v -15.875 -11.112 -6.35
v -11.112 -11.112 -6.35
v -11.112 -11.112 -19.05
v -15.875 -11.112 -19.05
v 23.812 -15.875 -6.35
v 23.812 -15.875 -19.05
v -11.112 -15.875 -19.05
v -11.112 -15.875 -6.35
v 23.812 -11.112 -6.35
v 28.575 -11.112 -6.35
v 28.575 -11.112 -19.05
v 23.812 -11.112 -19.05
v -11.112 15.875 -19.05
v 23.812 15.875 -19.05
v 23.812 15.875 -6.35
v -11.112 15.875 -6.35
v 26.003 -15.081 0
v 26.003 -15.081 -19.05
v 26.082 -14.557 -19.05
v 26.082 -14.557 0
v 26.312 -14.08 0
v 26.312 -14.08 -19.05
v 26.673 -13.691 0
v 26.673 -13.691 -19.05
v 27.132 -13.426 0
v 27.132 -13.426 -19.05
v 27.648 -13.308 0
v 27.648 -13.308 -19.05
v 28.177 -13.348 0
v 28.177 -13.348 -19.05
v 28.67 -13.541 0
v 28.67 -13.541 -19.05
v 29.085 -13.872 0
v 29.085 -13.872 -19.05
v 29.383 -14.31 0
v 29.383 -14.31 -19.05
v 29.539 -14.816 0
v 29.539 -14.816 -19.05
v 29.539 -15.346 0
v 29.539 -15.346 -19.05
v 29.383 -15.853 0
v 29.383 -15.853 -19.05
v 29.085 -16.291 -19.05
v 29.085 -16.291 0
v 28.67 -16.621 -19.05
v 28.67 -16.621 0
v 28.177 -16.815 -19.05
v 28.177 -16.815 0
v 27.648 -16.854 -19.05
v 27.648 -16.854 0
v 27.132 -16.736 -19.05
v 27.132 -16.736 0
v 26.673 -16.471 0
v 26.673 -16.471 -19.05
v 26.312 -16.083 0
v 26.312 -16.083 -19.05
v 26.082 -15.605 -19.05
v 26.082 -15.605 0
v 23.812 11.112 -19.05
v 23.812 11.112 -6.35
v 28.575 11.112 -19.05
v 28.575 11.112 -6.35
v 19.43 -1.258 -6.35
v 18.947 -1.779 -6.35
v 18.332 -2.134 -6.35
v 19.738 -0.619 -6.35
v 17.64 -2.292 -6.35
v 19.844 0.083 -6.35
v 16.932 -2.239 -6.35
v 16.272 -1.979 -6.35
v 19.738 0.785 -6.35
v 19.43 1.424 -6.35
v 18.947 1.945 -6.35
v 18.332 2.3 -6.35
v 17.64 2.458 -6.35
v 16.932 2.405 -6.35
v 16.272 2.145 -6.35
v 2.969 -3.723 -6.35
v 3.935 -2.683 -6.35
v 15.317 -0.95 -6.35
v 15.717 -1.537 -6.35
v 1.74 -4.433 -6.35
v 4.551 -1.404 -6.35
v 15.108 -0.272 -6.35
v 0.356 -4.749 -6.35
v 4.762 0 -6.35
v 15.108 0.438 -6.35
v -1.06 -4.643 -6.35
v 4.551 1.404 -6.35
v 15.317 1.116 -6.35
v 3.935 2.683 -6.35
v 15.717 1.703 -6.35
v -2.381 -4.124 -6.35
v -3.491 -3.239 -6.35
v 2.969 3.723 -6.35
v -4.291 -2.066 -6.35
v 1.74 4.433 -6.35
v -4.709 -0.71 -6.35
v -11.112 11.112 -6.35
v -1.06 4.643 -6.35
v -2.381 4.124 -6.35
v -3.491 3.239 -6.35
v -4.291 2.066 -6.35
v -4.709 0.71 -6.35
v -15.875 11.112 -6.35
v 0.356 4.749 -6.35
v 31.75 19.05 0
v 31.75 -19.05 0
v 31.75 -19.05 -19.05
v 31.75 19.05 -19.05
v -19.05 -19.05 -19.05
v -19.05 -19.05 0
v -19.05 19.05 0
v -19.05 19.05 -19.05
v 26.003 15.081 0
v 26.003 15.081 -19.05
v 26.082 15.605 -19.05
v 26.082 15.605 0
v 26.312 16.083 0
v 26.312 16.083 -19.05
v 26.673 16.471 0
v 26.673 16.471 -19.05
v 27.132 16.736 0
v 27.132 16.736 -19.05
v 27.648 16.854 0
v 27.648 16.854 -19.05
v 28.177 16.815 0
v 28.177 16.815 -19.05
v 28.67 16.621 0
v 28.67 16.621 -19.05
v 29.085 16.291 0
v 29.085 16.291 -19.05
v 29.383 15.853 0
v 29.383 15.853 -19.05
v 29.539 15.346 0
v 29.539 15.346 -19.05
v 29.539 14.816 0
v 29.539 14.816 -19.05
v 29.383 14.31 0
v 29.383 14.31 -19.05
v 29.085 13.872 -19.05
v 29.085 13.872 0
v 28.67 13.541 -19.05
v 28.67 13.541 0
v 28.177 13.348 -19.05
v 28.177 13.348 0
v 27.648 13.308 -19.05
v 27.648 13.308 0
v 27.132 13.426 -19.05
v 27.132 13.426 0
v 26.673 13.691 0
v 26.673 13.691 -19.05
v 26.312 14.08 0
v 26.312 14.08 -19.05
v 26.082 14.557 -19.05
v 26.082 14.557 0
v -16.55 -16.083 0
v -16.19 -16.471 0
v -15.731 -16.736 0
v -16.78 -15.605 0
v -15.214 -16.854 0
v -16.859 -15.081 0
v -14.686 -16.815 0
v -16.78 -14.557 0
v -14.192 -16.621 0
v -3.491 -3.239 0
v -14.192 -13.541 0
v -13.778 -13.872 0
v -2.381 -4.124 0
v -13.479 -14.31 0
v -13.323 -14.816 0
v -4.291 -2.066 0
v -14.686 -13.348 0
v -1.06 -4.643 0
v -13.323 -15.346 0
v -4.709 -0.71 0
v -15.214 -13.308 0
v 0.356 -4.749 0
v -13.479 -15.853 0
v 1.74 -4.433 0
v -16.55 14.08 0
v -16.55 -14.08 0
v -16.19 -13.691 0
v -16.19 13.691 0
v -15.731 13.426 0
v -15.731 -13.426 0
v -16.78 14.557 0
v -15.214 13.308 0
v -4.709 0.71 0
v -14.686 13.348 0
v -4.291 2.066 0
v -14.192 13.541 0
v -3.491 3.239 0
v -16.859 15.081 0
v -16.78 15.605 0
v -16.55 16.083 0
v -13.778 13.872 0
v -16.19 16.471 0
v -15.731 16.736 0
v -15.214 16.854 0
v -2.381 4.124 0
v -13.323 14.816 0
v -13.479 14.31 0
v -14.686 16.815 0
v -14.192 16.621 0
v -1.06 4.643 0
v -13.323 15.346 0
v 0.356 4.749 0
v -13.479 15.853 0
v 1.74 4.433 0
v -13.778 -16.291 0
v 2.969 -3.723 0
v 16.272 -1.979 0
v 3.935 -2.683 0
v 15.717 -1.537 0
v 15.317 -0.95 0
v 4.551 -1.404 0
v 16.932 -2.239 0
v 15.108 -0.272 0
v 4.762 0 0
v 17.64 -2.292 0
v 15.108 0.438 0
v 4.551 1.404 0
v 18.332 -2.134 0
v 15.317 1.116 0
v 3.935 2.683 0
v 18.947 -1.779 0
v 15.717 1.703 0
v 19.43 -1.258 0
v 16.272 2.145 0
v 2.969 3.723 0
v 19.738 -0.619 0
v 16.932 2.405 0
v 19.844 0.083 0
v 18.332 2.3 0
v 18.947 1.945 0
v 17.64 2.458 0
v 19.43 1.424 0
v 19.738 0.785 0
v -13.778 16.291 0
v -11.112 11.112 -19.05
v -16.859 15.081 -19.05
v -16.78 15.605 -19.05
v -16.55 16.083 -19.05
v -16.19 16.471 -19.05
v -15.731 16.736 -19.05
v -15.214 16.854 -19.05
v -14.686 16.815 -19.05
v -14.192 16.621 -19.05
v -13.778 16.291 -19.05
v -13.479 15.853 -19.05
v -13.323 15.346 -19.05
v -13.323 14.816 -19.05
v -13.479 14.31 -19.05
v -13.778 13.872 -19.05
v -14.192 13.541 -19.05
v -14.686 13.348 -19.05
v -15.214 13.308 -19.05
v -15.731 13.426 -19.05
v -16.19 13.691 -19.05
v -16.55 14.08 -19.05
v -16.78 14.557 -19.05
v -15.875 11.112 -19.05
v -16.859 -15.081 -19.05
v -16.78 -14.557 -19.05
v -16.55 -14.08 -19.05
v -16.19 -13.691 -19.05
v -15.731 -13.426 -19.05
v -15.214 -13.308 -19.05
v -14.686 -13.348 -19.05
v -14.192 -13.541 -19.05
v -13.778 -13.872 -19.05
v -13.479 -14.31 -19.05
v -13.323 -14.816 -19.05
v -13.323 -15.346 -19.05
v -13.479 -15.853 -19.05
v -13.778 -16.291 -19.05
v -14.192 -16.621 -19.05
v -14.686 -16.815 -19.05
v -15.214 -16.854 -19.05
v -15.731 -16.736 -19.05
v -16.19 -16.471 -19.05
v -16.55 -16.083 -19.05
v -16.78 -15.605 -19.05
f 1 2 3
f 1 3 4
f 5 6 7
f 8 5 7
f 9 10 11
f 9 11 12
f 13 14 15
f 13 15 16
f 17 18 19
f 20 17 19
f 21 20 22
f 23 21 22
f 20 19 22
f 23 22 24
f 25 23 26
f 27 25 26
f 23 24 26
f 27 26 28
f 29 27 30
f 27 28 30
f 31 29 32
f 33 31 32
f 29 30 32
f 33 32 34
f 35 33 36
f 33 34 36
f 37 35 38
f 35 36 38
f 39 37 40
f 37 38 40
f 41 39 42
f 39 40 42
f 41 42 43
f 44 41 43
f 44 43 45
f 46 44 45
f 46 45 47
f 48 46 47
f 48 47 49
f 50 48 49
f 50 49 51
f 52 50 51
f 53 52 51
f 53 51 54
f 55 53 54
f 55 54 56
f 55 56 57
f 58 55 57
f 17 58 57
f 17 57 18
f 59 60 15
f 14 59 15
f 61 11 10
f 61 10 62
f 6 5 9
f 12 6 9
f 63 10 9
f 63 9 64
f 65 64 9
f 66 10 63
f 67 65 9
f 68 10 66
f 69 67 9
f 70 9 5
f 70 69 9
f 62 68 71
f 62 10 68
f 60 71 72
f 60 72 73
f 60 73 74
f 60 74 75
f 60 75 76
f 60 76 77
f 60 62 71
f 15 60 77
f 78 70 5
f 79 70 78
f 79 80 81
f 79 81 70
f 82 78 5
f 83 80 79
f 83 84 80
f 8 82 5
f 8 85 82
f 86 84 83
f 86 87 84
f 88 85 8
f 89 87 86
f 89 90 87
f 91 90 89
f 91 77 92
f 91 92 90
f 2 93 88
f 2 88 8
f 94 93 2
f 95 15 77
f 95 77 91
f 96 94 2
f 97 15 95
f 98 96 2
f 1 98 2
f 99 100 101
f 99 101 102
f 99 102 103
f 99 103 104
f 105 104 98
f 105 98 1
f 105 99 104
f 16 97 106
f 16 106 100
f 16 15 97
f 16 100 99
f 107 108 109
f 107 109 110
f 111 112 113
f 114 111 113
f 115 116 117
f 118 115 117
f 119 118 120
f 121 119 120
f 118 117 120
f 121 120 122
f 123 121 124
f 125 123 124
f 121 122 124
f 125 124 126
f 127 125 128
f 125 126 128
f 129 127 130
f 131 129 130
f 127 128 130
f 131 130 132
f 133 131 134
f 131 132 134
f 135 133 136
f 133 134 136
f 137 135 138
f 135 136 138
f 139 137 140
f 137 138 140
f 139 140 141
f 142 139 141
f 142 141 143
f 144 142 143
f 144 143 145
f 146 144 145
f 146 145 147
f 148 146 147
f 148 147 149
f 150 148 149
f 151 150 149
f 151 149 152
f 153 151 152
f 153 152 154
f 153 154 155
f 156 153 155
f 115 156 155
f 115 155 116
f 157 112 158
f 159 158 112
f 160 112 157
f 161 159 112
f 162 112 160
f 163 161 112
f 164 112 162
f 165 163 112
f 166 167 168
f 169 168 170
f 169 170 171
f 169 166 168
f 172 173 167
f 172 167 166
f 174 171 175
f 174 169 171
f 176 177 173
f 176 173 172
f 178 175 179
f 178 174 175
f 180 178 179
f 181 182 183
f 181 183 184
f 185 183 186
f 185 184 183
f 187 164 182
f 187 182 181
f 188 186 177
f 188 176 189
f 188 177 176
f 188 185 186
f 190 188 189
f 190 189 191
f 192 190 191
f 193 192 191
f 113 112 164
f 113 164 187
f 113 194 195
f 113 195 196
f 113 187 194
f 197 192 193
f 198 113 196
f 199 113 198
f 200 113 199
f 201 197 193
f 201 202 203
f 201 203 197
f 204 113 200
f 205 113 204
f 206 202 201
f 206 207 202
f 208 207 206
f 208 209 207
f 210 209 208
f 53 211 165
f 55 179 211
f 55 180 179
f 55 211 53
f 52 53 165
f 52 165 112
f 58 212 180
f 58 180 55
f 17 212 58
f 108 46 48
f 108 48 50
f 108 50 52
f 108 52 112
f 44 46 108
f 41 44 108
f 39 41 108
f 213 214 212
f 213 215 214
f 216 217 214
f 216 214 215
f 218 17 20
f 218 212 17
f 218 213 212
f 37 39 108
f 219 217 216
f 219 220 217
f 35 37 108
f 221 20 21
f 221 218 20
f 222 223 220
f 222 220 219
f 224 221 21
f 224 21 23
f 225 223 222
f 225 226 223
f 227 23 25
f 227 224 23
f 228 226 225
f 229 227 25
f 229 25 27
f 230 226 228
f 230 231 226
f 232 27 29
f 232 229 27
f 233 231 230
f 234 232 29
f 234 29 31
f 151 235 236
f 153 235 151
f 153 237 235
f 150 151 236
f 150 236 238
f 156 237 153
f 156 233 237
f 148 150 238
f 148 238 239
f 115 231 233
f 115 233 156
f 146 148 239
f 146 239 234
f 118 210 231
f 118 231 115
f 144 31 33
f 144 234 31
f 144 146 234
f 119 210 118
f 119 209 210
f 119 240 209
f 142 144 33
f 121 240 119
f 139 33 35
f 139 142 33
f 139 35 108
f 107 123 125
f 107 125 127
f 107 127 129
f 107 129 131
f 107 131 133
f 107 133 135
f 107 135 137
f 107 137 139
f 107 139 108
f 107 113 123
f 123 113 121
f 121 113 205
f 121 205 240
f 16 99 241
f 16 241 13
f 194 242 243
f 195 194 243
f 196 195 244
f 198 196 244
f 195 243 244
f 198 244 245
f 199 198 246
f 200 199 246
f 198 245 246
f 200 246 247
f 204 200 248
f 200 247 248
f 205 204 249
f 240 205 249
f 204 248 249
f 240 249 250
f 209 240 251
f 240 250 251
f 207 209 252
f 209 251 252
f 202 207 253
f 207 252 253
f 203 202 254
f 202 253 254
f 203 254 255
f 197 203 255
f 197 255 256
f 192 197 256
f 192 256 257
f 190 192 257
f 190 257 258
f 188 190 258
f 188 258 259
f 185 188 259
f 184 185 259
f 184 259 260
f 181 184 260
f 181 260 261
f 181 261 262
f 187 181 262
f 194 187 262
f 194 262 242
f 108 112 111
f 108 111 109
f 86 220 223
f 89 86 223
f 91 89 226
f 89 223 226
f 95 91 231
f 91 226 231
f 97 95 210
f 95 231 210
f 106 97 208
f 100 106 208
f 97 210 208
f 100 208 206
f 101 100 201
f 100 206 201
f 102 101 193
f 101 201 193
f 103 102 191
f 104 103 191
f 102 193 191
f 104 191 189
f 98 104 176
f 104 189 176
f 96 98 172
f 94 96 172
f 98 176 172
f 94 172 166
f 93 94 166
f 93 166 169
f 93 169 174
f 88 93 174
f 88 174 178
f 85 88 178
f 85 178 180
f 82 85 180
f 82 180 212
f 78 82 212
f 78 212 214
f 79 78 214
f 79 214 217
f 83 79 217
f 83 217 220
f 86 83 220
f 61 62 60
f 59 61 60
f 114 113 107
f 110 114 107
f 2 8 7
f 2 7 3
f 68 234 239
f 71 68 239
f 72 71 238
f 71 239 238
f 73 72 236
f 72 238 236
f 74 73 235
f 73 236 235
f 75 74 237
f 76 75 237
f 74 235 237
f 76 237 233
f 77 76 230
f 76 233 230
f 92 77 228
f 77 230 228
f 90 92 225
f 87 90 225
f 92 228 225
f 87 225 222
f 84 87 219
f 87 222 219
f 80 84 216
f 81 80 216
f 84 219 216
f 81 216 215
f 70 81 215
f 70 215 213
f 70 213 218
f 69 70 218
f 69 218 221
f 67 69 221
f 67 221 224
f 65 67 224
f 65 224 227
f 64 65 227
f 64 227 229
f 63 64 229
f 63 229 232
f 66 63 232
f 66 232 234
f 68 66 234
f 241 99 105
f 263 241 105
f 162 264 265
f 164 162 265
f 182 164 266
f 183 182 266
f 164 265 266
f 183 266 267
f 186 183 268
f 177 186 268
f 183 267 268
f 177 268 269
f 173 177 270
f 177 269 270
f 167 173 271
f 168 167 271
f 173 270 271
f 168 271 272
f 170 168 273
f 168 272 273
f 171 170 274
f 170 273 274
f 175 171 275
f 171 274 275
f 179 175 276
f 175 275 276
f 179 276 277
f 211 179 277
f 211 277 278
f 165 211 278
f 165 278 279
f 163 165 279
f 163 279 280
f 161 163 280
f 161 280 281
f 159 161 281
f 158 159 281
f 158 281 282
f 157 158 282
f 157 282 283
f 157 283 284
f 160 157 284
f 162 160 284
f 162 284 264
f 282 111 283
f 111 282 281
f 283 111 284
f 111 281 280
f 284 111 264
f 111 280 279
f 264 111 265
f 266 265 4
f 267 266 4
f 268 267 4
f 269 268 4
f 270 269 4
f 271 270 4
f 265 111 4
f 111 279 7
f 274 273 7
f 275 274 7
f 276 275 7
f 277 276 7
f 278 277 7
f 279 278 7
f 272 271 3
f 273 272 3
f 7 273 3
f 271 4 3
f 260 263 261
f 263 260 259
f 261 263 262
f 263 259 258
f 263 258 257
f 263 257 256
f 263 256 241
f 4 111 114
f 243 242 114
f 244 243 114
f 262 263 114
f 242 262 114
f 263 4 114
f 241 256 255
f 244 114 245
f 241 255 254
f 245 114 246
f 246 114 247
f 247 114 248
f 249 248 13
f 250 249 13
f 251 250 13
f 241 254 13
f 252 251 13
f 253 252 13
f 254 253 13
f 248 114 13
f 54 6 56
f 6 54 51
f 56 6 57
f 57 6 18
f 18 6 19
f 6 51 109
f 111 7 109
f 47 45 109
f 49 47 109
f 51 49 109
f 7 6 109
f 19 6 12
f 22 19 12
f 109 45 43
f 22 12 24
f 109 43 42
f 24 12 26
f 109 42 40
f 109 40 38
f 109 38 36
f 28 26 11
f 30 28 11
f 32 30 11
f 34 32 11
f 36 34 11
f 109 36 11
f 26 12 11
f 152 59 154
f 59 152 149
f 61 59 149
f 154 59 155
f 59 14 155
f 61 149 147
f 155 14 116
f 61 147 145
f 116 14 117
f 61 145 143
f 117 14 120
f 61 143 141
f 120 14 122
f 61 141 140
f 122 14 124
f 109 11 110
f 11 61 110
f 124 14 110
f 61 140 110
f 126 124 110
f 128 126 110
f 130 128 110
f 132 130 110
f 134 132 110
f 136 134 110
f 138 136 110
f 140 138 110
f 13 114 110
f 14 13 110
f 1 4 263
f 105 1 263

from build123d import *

# Parameters (mm, degrees)
SKETCH1_W           = 50.8
SKETCH1_H           = 38.1
BOSS_EXTRUDE1_DEPTH = 19.05
SKETCH2_W           = 44.45
SKETCH2_H           = 31.75
CUT_EXTRUDE1_DEPTH  = 12.7
SKETCH3_R           = 4.7625
SKETCH3_R_2         = 2.38125
CUT_EXTRUDE2_DEPTH  = 42.639734629
SKETCH4_W           = 7.9375
SKETCH4_H           = 7.9375
BOSS_EXTRUDE2_DEPTH = 12.7
SKETCH5_R           = 1.778
CUT_EXTRUDE3_DEPTH  = 42.639734629


with BuildPart() as part:
    # Sketch1 → Boss-Extrude1 (new body)
    with BuildSketch(Plane.XY):
        with Locations((6.35, 0)):
            Rectangle(SKETCH1_W, SKETCH1_H)
    extrude(amount=-BOSS_EXTRUDE1_DEPTH)

    # Sketch2 → Cut-Extrude1 (cut)
    with BuildSketch(Plane(origin=(0, 0, -19.05), x_dir=(-1, 0, 0), z_dir=(0, 0, -1))):
        with Locations((-6.35, 0)):
            Rectangle(SKETCH2_W, SKETCH2_H)
    extrude(amount=-CUT_EXTRUDE1_DEPTH, mode=Mode.SUBTRACT)

    # Sketch3 → Cut-Extrude2 (cut, through all)
    with BuildSketch(Plane.XY):
        Circle(SKETCH3_R)
        with Locations((17.462302917, 0.082964446)):
            Circle(SKETCH3_R_2)
    extrude(amount=-CUT_EXTRUDE2_DEPTH, mode=Mode.SUBTRACT)

    # Sketch4 → Boss-Extrude2 (add)
    with BuildSketch(Plane(origin=(0, 0, -6.35), x_dir=(-1, 0, 0), z_dir=(0, 0, -1))):
        with Locations((-27.78125, 15.08125)):
            Rectangle(SKETCH4_W, SKETCH4_H)
        with Locations((15.08125, 15.08125)):
            Rectangle(SKETCH4_W, SKETCH4_H)
        with Locations((15.08125, -15.08125)):
            Rectangle(SKETCH4_W, SKETCH4_H)
        with Locations((-27.78125, -15.08125)):
            Rectangle(SKETCH4_W, SKETCH4_H)
    extrude(amount=BOSS_EXTRUDE2_DEPTH)

    # Sketch5 → Cut-Extrude3 (cut, through all)
    with BuildSketch(Plane(origin=(0, 0, -19.05), x_dir=(-1, 0, 0), z_dir=(0, 0, -1))):
        with Locations((-27.78125, 15.08125)):
            Circle(SKETCH5_R)
        with Locations((15.08125, 15.08125)):
            Circle(SKETCH5_R)
        with Locations((15.08125, -15.08125)):
            Circle(SKETCH5_R)
        with Locations((-27.78125, -15.08125)):
            Circle(SKETCH5_R)
    extrude(amount=-CUT_EXTRUDE3_DEPTH, mode=Mode.SUBTRACT)


solid = part.part
